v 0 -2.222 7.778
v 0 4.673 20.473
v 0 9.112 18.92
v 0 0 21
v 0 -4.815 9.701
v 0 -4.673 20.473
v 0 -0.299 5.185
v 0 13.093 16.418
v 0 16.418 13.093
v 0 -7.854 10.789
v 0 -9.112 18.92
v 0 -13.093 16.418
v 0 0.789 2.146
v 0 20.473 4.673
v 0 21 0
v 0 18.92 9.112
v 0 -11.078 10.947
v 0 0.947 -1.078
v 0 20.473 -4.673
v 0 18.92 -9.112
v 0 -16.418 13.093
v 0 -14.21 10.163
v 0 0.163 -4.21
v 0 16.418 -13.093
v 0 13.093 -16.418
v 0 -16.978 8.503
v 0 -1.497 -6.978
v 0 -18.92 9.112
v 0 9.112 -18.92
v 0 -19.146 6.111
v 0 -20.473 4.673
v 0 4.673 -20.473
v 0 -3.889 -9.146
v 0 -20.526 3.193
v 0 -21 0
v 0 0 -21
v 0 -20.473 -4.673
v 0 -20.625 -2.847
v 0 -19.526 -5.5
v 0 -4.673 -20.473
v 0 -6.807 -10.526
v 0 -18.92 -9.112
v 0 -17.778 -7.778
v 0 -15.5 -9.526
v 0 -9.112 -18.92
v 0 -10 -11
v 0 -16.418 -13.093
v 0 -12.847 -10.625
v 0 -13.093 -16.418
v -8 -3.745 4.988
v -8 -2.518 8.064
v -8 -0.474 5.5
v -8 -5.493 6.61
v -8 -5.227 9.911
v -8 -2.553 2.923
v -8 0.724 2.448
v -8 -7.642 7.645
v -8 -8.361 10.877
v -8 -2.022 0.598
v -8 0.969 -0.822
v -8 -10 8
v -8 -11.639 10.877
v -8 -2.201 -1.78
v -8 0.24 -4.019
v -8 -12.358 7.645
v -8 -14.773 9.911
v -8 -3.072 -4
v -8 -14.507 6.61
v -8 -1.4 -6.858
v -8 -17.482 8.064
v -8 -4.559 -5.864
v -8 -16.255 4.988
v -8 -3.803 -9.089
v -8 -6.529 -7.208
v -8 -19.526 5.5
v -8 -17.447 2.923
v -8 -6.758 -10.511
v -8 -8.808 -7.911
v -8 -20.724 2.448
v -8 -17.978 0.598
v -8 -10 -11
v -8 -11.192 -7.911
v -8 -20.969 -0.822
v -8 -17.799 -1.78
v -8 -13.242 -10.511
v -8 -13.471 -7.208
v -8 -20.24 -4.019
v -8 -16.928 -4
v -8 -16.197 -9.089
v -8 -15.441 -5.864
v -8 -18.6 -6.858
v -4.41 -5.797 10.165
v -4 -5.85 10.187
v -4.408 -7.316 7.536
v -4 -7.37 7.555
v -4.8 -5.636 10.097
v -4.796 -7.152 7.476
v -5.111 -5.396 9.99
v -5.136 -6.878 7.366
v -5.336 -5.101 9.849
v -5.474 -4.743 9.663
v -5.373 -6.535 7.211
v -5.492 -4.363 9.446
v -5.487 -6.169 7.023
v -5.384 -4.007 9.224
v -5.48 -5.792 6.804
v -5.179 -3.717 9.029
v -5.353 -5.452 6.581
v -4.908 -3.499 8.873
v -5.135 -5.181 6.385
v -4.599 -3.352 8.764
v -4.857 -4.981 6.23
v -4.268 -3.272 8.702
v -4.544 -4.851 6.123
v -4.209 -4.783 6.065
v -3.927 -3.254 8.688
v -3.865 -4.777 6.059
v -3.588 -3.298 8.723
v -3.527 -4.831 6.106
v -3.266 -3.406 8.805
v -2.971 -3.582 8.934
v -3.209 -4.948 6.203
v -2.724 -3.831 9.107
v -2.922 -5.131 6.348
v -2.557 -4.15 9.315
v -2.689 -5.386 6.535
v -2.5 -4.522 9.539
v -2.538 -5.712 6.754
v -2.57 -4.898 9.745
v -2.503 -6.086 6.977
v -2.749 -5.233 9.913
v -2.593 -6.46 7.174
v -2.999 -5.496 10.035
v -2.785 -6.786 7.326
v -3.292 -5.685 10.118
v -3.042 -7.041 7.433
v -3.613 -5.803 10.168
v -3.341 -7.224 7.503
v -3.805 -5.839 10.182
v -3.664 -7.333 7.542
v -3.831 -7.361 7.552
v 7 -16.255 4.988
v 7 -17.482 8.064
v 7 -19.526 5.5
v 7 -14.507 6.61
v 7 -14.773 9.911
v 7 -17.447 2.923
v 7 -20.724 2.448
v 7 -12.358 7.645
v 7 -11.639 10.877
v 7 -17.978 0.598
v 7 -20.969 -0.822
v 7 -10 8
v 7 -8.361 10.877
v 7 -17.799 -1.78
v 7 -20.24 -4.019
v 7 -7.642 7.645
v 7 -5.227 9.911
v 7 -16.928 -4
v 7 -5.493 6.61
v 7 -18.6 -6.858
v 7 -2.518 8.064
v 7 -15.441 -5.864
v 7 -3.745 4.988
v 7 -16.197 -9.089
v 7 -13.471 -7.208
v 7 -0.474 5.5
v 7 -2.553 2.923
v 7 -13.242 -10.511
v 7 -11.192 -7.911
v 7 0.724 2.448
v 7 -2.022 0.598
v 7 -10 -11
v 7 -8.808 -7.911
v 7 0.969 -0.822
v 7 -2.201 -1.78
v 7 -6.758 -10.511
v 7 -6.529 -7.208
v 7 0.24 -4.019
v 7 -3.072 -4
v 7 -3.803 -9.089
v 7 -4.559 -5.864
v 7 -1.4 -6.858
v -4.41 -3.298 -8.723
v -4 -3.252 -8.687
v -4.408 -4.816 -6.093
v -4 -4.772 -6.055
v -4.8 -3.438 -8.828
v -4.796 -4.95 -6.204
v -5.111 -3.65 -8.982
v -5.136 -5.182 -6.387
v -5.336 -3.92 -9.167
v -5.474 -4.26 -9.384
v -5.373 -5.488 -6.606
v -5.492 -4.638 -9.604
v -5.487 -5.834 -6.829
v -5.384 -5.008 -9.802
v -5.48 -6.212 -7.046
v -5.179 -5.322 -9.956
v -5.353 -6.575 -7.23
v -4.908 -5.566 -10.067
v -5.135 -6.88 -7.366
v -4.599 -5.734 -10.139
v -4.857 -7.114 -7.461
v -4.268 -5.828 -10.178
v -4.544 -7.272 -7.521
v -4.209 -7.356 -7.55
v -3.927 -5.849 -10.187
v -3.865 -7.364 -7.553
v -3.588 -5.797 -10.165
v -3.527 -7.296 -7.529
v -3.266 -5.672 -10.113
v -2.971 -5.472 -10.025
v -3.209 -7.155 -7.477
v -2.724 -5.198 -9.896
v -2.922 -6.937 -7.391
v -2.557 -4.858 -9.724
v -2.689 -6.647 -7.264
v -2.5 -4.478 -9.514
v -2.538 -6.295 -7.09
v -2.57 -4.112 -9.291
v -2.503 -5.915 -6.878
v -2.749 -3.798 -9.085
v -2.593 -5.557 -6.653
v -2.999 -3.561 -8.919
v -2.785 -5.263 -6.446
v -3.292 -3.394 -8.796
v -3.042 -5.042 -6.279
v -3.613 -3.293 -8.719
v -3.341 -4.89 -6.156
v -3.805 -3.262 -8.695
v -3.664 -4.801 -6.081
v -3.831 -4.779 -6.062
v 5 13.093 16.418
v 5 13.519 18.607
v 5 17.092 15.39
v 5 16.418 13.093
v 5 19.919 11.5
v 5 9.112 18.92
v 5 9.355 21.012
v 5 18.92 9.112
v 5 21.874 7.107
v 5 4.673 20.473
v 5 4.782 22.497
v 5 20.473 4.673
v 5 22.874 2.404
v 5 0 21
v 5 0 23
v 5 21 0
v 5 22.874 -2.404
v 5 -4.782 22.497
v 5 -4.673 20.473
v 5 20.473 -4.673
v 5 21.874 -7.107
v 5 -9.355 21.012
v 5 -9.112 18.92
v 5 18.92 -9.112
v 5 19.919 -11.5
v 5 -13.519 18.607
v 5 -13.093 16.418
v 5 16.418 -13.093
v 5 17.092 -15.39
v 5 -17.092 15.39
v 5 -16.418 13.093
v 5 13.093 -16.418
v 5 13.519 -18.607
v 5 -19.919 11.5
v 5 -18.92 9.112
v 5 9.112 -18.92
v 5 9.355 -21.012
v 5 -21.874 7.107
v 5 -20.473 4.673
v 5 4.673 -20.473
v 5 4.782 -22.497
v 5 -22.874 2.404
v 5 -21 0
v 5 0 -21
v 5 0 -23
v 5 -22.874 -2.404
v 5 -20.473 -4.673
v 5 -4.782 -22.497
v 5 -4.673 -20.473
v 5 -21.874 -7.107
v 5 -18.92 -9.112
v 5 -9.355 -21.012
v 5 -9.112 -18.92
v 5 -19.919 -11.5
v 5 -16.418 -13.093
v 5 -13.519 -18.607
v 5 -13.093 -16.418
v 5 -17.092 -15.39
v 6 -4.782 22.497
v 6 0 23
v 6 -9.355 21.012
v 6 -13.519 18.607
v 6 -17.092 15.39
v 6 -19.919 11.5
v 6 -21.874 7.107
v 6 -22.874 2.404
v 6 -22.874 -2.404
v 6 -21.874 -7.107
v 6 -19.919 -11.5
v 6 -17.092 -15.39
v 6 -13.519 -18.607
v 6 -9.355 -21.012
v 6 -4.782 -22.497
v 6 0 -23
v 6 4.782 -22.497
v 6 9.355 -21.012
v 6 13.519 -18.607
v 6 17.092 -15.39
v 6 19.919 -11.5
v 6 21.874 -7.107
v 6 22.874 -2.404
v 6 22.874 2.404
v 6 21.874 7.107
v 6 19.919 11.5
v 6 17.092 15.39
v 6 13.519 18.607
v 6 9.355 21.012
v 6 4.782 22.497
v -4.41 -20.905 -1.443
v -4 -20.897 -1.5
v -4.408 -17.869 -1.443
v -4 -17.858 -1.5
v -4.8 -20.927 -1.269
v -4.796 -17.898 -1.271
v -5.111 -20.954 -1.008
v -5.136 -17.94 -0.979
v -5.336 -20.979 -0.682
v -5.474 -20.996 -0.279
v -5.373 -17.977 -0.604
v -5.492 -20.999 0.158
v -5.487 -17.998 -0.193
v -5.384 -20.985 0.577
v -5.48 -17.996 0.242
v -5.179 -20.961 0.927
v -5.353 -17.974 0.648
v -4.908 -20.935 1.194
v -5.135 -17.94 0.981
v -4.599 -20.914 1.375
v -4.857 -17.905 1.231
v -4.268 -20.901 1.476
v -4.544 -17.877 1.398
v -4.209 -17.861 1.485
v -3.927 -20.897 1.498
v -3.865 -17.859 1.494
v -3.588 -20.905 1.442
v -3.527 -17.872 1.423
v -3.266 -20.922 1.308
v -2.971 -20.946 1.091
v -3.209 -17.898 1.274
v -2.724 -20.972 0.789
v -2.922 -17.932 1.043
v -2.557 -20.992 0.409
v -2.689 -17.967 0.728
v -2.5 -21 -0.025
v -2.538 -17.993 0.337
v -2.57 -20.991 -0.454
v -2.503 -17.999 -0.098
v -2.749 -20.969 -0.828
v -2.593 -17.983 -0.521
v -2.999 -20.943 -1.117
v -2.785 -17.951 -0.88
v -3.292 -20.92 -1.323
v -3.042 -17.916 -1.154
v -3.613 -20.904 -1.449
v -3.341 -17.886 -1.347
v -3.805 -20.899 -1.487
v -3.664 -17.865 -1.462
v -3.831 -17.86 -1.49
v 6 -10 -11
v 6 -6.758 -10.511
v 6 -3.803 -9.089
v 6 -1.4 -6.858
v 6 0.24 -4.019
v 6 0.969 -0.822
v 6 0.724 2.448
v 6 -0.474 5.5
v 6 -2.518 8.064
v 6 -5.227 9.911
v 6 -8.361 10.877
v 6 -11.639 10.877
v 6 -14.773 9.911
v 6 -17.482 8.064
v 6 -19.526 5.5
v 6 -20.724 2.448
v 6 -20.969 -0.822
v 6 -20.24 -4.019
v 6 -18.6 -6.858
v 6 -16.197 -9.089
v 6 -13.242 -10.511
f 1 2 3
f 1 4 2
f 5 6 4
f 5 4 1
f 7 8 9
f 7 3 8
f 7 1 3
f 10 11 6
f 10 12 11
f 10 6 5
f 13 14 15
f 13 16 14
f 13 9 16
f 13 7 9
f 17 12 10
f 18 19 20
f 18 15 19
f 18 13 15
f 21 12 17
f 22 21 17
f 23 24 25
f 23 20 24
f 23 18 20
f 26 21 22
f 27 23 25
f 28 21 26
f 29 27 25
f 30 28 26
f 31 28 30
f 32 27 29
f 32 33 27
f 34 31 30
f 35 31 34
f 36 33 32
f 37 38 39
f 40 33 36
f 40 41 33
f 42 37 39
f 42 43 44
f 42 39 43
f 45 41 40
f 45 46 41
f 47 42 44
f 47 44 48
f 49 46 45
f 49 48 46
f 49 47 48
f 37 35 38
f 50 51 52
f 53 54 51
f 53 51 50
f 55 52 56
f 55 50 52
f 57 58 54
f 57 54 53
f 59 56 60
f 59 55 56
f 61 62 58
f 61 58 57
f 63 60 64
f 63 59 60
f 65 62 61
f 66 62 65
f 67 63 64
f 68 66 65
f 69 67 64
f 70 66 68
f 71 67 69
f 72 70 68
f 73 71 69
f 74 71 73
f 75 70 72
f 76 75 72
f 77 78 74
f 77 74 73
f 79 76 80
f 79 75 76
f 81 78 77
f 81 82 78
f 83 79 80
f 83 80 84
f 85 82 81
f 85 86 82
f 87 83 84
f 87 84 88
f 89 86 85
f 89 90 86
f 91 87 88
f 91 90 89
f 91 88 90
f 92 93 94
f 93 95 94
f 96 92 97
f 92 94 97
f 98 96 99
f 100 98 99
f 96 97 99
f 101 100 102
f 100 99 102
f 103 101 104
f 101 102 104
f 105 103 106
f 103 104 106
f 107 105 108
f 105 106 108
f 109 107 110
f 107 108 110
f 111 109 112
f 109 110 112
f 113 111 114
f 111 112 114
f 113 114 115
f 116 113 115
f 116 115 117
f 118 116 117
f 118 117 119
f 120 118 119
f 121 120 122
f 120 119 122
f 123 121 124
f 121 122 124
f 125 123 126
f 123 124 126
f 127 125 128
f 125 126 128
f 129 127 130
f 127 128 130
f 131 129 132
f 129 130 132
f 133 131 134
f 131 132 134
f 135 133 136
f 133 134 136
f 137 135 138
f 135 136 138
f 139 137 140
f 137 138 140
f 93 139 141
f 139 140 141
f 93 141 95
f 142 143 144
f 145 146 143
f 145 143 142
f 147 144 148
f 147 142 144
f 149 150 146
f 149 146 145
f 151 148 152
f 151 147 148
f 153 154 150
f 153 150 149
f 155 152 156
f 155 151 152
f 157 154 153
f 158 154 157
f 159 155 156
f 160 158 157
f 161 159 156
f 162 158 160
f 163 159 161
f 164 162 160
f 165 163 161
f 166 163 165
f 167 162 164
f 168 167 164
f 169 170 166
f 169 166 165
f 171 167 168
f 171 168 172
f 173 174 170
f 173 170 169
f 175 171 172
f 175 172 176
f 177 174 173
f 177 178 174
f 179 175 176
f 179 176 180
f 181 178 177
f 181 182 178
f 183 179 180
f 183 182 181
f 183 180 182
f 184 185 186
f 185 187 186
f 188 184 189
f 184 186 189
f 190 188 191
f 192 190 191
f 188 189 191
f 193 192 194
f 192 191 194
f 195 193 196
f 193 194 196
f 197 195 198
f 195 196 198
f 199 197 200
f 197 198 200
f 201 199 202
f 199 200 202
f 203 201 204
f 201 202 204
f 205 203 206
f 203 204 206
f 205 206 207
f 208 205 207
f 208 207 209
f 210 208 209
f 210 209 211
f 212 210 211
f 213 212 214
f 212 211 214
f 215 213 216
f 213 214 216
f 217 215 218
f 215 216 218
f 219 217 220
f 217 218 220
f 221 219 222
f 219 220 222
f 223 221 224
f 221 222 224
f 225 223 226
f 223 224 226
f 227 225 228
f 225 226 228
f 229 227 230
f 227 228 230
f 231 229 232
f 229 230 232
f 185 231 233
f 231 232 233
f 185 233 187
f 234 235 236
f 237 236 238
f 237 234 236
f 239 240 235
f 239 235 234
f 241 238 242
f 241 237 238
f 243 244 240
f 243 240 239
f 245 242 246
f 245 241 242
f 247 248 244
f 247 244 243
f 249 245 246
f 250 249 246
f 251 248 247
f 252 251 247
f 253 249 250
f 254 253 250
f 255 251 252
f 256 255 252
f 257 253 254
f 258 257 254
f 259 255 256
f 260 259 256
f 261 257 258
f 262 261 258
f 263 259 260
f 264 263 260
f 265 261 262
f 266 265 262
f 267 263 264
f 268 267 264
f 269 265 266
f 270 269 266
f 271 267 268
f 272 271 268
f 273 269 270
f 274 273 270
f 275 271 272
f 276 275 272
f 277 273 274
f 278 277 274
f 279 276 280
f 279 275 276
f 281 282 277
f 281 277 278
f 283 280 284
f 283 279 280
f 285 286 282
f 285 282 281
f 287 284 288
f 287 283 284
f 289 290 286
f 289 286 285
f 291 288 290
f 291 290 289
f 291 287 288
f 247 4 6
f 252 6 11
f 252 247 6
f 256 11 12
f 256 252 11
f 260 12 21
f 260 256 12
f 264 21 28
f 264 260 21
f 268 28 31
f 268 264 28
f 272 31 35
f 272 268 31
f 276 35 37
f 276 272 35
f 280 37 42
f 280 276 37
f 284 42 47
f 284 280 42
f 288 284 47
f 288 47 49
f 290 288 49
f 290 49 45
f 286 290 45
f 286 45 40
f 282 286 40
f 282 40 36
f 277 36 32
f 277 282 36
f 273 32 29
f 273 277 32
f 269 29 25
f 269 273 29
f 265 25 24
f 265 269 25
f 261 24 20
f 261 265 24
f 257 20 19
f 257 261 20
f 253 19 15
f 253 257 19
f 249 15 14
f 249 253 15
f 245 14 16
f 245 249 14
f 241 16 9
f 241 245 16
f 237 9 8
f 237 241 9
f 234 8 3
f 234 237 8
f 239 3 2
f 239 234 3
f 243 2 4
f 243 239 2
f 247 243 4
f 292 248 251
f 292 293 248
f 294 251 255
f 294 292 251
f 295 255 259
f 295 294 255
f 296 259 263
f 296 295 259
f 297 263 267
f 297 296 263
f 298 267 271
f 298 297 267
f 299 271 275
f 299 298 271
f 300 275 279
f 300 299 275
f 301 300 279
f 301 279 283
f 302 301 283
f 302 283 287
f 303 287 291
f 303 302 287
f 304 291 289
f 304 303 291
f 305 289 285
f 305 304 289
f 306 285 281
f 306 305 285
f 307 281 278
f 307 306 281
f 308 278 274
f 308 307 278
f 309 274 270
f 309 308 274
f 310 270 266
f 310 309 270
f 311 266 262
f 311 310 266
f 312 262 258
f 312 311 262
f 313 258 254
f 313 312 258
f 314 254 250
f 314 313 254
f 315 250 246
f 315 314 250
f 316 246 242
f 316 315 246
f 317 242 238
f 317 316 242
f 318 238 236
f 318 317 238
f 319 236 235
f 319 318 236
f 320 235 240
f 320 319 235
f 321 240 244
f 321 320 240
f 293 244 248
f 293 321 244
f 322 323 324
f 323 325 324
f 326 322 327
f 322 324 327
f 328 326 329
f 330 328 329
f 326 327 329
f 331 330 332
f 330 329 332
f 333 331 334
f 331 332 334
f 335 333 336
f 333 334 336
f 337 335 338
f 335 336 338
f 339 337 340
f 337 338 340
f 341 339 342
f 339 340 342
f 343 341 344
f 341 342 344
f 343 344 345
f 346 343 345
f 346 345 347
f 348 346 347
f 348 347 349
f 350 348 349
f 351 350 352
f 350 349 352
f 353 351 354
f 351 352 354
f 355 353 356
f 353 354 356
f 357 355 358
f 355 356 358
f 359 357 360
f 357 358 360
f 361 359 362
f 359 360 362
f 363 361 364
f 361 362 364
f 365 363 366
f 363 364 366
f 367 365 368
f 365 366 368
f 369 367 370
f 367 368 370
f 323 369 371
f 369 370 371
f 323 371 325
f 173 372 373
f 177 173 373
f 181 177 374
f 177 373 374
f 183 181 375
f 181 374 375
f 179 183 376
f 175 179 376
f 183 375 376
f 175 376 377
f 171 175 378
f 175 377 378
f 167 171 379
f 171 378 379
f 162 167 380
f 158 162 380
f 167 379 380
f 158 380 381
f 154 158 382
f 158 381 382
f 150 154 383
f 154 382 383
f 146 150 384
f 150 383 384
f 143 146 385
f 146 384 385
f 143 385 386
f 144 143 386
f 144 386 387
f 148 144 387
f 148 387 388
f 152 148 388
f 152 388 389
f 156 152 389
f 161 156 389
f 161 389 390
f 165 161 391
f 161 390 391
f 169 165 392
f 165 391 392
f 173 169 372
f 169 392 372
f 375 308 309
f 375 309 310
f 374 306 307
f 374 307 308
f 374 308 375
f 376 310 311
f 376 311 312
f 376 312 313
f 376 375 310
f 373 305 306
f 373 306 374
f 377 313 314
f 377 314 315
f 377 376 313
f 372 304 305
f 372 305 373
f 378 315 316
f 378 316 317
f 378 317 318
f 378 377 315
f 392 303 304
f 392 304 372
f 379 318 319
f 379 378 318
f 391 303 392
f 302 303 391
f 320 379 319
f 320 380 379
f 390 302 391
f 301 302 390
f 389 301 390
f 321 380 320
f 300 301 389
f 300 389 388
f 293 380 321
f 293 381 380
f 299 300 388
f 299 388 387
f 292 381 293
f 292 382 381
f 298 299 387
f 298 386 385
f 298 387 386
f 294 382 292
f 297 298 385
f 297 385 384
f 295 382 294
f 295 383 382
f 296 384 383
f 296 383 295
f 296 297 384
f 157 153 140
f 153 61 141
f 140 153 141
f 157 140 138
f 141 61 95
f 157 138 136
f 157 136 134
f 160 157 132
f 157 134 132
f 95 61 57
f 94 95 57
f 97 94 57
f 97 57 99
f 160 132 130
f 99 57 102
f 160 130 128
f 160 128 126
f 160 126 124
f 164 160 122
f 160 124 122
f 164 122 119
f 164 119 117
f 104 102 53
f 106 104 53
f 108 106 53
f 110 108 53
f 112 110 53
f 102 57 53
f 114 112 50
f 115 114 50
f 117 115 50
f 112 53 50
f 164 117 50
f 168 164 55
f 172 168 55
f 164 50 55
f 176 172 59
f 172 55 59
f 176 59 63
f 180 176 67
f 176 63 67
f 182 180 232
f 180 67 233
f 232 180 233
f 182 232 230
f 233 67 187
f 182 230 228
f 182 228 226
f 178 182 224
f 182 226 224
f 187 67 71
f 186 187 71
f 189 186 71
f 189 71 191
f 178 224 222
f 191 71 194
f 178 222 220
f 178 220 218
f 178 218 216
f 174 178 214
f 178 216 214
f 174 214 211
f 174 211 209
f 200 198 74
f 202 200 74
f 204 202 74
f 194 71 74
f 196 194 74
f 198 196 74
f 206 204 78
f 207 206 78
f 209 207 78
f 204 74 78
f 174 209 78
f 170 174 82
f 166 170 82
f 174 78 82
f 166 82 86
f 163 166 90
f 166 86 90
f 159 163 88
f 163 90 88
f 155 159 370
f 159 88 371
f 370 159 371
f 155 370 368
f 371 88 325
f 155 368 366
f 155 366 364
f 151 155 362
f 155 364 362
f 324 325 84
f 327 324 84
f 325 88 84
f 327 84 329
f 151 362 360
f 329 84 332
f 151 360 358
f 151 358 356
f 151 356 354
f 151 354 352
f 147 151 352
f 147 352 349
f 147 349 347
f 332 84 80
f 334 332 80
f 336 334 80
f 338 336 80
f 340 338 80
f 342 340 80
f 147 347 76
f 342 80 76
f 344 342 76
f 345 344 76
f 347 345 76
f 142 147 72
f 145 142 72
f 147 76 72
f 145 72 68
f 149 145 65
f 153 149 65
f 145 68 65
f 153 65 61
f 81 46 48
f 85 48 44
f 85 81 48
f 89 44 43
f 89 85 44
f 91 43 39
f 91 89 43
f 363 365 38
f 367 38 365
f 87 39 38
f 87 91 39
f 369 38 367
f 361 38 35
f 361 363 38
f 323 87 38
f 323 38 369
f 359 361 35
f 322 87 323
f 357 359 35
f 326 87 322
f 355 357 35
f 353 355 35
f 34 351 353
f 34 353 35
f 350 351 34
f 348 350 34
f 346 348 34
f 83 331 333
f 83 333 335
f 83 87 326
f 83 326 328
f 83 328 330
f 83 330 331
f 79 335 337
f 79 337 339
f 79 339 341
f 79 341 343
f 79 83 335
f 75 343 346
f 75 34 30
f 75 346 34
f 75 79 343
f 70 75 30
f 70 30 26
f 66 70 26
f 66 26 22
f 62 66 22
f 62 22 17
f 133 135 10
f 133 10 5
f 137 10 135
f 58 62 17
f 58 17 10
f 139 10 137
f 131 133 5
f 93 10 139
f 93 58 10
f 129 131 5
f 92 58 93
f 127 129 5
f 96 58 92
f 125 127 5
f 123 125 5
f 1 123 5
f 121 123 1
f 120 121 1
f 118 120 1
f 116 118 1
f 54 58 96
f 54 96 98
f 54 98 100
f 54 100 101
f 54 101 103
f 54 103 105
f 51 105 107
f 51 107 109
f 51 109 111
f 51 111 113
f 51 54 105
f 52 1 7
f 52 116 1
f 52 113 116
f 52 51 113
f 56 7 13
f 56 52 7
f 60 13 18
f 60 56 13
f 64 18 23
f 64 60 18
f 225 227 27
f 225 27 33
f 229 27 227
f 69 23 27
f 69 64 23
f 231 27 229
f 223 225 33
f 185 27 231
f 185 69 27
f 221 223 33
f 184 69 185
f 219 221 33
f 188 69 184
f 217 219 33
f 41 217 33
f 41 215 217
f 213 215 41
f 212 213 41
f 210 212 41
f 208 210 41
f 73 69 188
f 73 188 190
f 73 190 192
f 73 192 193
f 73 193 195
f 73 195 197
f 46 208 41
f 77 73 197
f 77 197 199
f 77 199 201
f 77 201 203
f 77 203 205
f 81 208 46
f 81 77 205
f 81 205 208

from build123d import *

# Parameters (mm, degrees)
SKETCH2_R           = 11
BOSS_EXTRUDE1_DEPTH = 1
BOSS_EXTRUDE2_START = 8
SKETCH3_R           = 11
SKETCH3_R_2         = 8
BOSS_EXTRUDE2_DEPTH = 8
SKETCH4_R           = 8
CUT_EXTRUDE1_DEPTH  = 34.496268449
SKETCH5_W           = 1.5
SKETCH5_H           = 6.215499562
CIRPATTERN1_COUNT   = 3


with BuildPart() as part:
    # Sketch1 → Revolve1 (revolve)
    with BuildSketch(Plane.XY, mode=Mode.PRIVATE) as revolve1_sk:
        Polygon((0, 0), (0, 21), (5, 21), (5, 23), (6, 23), (6, 0), align=None)
    revolve(revolve1_sk.sketch.rotate(Axis((0, 0, 0), (1, 0, 0)), 90), axis=Axis((0, 0, 0), (1, 0, 0)))

    # Sketch2 → Boss-Extrude1 (add)
    with BuildSketch(Plane(origin=(6, 0, 0), x_dir=(0, 0, -1), z_dir=(1, 0, 0))):
        with Locations((0, -10)):
            Circle(SKETCH2_R)
    extrude(amount=BOSS_EXTRUDE1_DEPTH)

    # Sketch3 → Boss-Extrude2 (add)
    with BuildSketch(Plane.ZY.offset(BOSS_EXTRUDE2_START)):
        with Locations(Location((0, -10, 0), (0, 0, 180))):
            Circle(SKETCH3_R)
        with Locations((0, -10)):
            Circle(SKETCH3_R_2, mode=Mode.SUBTRACT)
    extrude(amount=-BOSS_EXTRUDE2_DEPTH)

    # Sketch4 → Cut-Extrude1 (cut, through all)
    with BuildSketch(Plane.ZY):
        with Locations((0, -10)):
            Circle(SKETCH4_R)
    extrude(amount=-CUT_EXTRUDE1_DEPTH, mode=Mode.SUBTRACT)

    # Sketch5 → Cut-Revolve3 (revolve, cut)
    with BuildSketch(Plane.XY, mode=Mode.PRIVATE) as cut_revolve3_sk:
        with Locations((-4.75, -19.69259974)):
            Rectangle(SKETCH5_W, SKETCH5_H)
    cut_revolve3 = revolve(cut_revolve3_sk.sketch.rotate(Axis((-4, -21, 0), (0, 1, 0)), 270), axis=Axis((-4, -21, 0), (0, 1, 0)), mode=Mode.SUBTRACT)

    # CirPattern1: Cut-Revolve3 ×3 about axis
    cirpattern1_axis = Axis((-8, -10, 0), (1, 0, 0))
    for i in range(1, CIRPATTERN1_COUNT):
        add(cut_revolve3.rotate(cirpattern1_axis, i * 360 / CIRPATTERN1_COUNT), mode=Mode.SUBTRACT)


solid = part.part
